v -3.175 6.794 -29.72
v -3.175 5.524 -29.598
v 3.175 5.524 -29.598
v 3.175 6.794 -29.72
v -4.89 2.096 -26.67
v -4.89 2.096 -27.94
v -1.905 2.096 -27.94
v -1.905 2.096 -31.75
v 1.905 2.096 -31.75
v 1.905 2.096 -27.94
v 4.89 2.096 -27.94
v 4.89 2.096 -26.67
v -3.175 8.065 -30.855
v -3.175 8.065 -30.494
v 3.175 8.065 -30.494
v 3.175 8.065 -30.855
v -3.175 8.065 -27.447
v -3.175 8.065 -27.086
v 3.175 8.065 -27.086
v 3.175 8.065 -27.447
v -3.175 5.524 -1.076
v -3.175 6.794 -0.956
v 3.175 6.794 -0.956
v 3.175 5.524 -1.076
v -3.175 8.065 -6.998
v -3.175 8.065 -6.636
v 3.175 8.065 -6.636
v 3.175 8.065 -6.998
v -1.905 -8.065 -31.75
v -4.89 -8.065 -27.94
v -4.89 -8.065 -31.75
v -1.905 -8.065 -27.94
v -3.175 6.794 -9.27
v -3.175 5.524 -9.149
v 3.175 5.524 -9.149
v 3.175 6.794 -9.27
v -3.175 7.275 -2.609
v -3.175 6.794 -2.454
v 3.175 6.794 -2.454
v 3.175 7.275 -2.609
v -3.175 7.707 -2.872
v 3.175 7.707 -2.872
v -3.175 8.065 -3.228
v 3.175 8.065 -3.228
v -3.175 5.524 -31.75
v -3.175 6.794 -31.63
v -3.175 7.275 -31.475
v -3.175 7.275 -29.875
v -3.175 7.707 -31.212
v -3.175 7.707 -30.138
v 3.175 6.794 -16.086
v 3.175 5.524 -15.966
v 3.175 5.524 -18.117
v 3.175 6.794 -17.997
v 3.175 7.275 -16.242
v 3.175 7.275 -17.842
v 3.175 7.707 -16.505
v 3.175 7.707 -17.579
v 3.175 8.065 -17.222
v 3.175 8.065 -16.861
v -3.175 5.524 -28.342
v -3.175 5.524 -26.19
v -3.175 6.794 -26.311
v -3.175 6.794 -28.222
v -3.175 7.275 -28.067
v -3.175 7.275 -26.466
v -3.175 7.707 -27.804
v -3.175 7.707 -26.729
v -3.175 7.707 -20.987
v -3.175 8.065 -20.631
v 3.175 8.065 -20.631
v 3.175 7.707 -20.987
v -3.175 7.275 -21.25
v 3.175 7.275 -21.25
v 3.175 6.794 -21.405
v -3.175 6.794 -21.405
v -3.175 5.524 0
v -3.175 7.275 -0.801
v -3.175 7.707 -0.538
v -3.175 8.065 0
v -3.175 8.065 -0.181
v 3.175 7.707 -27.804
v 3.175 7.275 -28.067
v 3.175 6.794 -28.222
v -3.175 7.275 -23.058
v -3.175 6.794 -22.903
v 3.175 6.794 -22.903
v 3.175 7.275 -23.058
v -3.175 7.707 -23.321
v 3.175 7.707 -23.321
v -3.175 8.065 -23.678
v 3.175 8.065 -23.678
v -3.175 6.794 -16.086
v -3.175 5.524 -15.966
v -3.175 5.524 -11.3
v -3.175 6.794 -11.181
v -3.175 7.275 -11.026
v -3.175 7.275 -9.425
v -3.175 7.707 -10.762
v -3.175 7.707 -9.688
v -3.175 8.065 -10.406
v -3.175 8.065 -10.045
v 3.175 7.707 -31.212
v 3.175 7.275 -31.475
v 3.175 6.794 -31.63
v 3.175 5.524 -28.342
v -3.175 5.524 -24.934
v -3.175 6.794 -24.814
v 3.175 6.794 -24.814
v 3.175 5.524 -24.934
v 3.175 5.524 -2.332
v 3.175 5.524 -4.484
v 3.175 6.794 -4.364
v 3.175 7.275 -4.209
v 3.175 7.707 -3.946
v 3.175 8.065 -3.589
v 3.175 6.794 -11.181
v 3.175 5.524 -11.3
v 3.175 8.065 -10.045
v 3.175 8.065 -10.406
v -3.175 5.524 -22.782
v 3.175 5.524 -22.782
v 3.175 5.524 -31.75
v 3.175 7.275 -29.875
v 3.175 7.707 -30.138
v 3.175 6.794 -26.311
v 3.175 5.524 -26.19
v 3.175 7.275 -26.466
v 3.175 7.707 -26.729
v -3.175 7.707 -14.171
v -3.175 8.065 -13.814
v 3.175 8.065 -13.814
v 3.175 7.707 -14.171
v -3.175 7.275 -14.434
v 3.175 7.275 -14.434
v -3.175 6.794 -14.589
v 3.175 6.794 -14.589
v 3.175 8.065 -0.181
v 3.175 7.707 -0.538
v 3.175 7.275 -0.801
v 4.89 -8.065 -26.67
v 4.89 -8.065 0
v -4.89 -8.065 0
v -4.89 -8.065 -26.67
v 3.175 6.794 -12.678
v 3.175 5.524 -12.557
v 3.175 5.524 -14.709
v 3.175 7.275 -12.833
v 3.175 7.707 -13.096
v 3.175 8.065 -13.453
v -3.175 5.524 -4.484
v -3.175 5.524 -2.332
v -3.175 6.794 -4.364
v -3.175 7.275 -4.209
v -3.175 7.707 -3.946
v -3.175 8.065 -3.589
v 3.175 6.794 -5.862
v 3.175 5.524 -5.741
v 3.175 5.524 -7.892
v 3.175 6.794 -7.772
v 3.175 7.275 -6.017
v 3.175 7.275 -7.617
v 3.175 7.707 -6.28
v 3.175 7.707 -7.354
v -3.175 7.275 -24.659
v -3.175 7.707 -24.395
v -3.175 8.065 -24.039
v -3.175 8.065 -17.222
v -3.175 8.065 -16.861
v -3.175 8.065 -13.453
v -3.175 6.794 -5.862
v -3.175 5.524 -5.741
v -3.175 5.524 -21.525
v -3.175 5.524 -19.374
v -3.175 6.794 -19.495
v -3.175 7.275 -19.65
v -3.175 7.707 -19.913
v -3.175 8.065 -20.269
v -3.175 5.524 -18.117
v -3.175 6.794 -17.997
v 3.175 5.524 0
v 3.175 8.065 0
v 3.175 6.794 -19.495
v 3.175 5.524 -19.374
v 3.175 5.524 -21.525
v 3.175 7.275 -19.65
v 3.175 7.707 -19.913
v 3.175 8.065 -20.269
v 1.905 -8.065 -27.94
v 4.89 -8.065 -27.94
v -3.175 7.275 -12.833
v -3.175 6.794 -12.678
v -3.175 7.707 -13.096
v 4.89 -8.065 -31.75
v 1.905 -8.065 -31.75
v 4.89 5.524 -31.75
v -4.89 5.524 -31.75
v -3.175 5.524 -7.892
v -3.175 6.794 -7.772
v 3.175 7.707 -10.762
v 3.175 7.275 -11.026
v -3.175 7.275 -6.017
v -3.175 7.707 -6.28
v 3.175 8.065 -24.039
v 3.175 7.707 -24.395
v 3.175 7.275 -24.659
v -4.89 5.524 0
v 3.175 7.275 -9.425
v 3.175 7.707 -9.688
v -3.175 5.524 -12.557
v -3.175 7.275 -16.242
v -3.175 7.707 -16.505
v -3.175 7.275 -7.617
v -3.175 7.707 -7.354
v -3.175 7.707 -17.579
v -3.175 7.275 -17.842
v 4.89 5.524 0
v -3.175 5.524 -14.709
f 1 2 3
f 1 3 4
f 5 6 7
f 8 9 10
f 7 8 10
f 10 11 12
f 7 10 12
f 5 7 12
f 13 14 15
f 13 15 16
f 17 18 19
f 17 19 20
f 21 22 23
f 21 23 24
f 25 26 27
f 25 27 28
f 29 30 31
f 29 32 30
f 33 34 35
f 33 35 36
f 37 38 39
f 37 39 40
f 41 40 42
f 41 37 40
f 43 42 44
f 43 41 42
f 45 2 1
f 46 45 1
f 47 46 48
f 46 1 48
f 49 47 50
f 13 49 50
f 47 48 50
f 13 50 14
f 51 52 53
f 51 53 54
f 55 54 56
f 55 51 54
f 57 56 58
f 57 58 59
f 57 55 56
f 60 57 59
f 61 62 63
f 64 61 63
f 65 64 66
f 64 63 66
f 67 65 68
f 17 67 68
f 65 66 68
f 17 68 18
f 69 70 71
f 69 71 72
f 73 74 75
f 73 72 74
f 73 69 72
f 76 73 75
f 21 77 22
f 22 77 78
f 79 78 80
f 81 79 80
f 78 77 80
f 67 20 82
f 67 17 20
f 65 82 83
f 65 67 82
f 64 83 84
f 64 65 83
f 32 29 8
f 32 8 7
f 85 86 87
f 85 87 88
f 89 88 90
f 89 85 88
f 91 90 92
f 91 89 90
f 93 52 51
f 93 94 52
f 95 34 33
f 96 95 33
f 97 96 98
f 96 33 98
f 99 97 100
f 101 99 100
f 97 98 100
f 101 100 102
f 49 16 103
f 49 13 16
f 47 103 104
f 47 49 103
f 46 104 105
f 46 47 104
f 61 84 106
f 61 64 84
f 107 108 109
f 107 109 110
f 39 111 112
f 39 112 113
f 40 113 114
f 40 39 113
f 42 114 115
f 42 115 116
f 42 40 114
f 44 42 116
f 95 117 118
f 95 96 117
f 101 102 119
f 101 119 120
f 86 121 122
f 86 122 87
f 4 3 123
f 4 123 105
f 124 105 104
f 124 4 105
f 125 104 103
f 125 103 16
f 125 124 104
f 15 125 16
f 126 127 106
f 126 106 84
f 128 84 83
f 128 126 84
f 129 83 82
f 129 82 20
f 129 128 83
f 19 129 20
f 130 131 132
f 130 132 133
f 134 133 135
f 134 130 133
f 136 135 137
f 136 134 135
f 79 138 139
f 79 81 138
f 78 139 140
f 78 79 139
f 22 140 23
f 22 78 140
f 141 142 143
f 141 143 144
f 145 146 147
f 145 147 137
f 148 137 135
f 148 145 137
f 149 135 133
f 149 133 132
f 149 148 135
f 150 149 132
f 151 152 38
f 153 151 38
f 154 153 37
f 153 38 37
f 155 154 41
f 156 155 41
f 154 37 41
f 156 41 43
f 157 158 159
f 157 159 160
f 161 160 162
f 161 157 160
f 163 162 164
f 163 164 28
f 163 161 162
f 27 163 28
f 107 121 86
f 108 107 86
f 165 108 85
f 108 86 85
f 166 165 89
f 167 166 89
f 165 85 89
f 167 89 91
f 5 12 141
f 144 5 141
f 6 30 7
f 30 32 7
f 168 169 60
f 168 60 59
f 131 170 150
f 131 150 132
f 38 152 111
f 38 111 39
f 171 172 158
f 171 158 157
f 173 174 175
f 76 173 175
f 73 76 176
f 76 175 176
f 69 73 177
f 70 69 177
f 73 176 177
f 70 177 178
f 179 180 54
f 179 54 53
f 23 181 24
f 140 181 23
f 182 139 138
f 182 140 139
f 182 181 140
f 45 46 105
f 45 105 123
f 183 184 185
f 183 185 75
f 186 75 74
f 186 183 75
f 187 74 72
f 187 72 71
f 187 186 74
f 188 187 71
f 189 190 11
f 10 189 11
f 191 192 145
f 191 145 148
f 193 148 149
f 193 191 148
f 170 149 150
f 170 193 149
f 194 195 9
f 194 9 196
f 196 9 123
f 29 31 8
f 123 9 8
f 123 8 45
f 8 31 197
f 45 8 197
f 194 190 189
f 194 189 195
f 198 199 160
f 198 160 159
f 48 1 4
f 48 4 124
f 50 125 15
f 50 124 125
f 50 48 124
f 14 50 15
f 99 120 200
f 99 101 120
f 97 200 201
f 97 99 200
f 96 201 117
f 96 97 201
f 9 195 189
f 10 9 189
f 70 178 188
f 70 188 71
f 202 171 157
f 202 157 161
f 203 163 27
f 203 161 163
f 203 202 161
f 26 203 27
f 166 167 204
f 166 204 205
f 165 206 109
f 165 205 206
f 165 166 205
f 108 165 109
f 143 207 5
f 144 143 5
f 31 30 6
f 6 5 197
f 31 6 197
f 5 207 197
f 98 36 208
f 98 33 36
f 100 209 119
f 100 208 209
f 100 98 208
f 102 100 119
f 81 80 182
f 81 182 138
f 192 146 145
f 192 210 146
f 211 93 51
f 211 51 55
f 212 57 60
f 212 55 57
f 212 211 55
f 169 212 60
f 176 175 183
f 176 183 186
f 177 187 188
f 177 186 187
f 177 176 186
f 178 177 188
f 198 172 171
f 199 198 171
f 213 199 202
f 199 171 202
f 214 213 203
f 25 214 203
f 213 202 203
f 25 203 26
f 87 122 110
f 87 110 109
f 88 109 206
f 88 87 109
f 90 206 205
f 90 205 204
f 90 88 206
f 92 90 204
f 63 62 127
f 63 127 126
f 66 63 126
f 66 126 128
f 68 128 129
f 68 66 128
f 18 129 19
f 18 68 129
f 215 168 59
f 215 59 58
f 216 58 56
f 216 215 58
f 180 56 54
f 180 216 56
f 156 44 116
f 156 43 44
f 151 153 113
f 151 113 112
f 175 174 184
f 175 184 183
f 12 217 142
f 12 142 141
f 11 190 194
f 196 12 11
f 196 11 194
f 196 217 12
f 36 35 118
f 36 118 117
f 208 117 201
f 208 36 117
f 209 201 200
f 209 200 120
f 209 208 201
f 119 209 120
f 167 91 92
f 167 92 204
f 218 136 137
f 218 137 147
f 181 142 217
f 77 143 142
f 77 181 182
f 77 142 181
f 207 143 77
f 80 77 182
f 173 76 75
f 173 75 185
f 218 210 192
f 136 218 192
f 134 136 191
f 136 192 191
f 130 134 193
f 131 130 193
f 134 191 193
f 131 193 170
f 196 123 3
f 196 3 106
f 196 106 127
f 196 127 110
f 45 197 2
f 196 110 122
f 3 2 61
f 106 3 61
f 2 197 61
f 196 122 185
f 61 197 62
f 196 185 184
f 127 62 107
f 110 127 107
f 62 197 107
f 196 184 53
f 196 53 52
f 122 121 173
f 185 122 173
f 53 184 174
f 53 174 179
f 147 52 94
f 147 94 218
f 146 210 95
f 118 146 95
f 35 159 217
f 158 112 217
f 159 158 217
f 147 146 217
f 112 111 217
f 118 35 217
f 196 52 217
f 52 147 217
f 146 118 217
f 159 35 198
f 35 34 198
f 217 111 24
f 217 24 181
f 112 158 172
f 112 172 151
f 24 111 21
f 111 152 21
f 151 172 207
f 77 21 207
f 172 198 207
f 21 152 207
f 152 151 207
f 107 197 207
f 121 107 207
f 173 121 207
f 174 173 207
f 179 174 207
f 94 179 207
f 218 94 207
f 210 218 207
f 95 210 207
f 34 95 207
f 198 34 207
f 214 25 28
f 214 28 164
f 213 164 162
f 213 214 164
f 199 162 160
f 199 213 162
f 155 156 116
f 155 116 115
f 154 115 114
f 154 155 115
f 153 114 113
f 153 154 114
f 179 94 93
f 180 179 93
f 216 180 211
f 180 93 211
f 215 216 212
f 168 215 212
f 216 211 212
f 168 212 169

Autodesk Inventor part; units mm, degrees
ref_plane "YZ Plane" through (0, 0, 0) normal (1, 0, 0) x (0, 1, 0)
ref_plane "XZ Plane" through (0, 0, 0) normal (0, 1, 0) x (-1, 0, 0)
ref_plane "XY Plane" through (0, 0, 0) normal (0, 0, 1) x (1, 0, 0)
sketch "Sketch2" plane through (0, 0, 0) normal (1, 0, 0) x (0, 1, 0)
  line L0 (-5.5245, 31.75) -> (-5.5245, -31.75)
  line L1 (-5.5245, -31.75) -> (5.5245, -31.75)
  line L2 (5.5245, -31.75) -> (5.5245, 31.75)
  line L3 (5.5245, 31.75) -> (-5.5245, 31.75)
  line L4 (-5.5245, 31.75) -> (5.5245, -31.75) construction
  line L5 (-5.5245, -31.75) -> (5.5245, 31.75) construction
  point P0 (0, 0)
  dimension "d4" = 63.5
  dimension "d5" = 11.049
extrude "Extrusion2" add sketch "Sketch2" along normal mid plane 9.779
sketch "Sketch3" plane through (0, 0, 0) normal (1, 0, 0) x (0, 1, 0)
  line L0 (5.5245, -31.75) -> (5.5245, 31.75) projected
  line L1 (5.5245, 31.9532) -> (5.5245, 29.4132)
  line L2 (5.5245, 31.9532) -> (5.5245, 29.4132)
  arc A0 (8.0645, 30.8543) -> (6.7945, 31.629) centre (6.3804, 29.5218) ccw
  line L3 (8.0645, 30.6737) -> (7.6408, 30.6737)
  arc A1 (6.7945, 29.7184) -> (8.0645, 30.4931) centre (6.3804, 31.8256) ccw
  line L4 (8.0645, 30.8543) -> (8.0645, 30.4931)
  line L5 (5.5245, 31.75) -> (5.5245, -31.75)
  arc A2 (8.0642, -1.6042) -> (8.0645, -1.6033) centre (6.6313, -1.0154) ccw
  line L6 (6.7945, 31.629) -> (5.5245, 31.7489)
  line L7 (6.7945, 29.7184) -> (5.5245, 29.5986)
  line L8 (5.5245, 31.7489) -> (6.7945, 31.629)
  line L9 (6.7945, 29.7184) -> (5.5245, 29.5986)
  line L10 (5.5245, 29.5986) -> (5.5245, 31.7489)
  arc A3 (8.0645, 30.8543) -> (6.7945, 31.629) centre (6.3804, 29.5218) ccw
  arc A4 (6.7945, 29.7184) -> (8.0645, 30.4931) centre (6.3804, 31.8256) ccw
  line L11 (8.0645, 30.8543) -> (8.0645, 30.4931)
  line L12 (8.0645, 27.2655) -> (7.6408, 27.2655)
  line L13 (8.0645, 27.4461) -> (8.0645, 27.0848)
  line L14 (8.0645, 27.4461) -> (8.0645, 27.0848)
  arc A5 (6.7945, 26.3101) -> (8.0645, 27.0848) centre (6.3804, 28.4173) ccw
  arc A6 (8.0645, 27.4461) -> (6.7945, 28.2208) centre (6.3804, 26.1136) ccw
  arc A7 (6.7945, 26.3101) -> (8.0645, 27.0848) centre (6.3804, 28.4173) ccw
  arc A8 (8.0645, 27.4461) -> (6.7945, 28.2208) centre (6.3804, 26.1136) ccw
  line L15 (5.5245, 28.3417) -> (5.5245, -35.1582)
  line L16 (5.5245, 28.5449) -> (5.5245, 26.0049)
  line L17 (6.7945, 26.3101) -> (5.5245, 26.1903)
  line L18 (5.5245, 28.3406) -> (6.7945, 28.2208)
  line L19 (6.7945, 26.3101) -> (5.5245, 26.1903)
  line L20 (5.5245, 26.1903) -> (5.5245, 28.3406)
  line L21 (5.5245, 28.5449) -> (5.5245, 26.0049)
  line L22 (6.7945, 28.2208) -> (5.5245, 28.3406)
  line L23 (8.0645, 23.8572) -> (7.6408, 23.8572)
  line L24 (8.0645, 24.0378) -> (8.0645, 23.6766)
  line L25 (8.0645, 24.0378) -> (8.0645, 23.6766)
  arc A9 (6.7945, 22.9019) -> (8.0645, 23.6766) centre (6.3804, 25.0091) ccw
  arc A10 (8.0645, 24.0378) -> (6.7945, 24.8125) centre (6.3804, 22.7053) ccw
  arc A11 (6.7945, 22.9019) -> (8.0645, 23.6766) centre (6.3804, 25.0091) ccw
  arc A12 (8.0645, 24.0378) -> (6.7945, 24.8125) centre (6.3804, 22.7053) ccw
  line L26 (5.5245, 24.9335) -> (5.5245, -38.5665)
  line L27 (5.5245, 25.1367) -> (5.5245, 22.5967)
  line L28 (6.7945, 22.9019) -> (5.5245, 22.782)
  line L29 (5.5245, 24.9324) -> (6.7945, 24.8125)
  line L30 (6.7945, 22.9019) -> (5.5245, 22.782)
  line L31 (5.5245, 22.782) -> (5.5245, 24.9324)
  line L32 (5.5245, 25.1367) -> (5.5245, 22.5967)
  line L33 (6.7945, 24.8125) -> (5.5245, 24.9324)
  line L34 (8.0645, 20.449) -> (7.6408, 20.449)
  line L35 (8.0645, 20.6296) -> (8.0645, 20.2683)
  line L36 (8.0645, 20.6296) -> (8.0645, 20.2683)
  arc A13 (6.7945, 19.4936) -> (8.0645, 20.2683) centre (6.3804, 21.6008) ccw
  arc A14 (8.0645, 20.6296) -> (6.7945, 21.4043) centre (6.3804, 19.2971) ccw
  arc A15 (6.7945, 19.4936) -> (8.0645, 20.2683) centre (6.3804, 21.6008) ccw
  arc A16 (8.0645, 20.6296) -> (6.7945, 21.4043) centre (6.3804, 19.2971) ccw
  line L37 (5.5245, 21.5252) -> (5.5245, -41.9747)
  line L38 (5.5245, 21.7284) -> (5.5245, 19.1884)
  line L39 (6.7945, 19.4936) -> (5.5245, 19.3738)
  line L40 (5.5245, 21.5241) -> (6.7945, 21.4043)
  line L41 (6.7945, 19.4936) -> (5.5245, 19.3738)
  line L42 (5.5245, 19.3738) -> (5.5245, 21.5241)
  line L43 (5.5245, 21.7284) -> (5.5245, 19.1884)
  line L44 (6.7945, 21.4043) -> (5.5245, 21.5241)
  line L45 (8.0645, 17.0407) -> (7.6408, 17.0407)
  line L46 (8.0645, 17.2213) -> (8.0645, 16.8601)
  line L47 (8.0645, 17.2213) -> (8.0645, 16.8601)
  arc A17 (6.7945, 16.0854) -> (8.0645, 16.8601) centre (6.3804, 18.1926) ccw
  arc A18 (8.0645, 17.2213) -> (6.7945, 17.996) centre (6.3804, 15.8888) ccw
  arc A19 (6.7945, 16.0854) -> (8.0645, 16.8601) centre (6.3804, 18.1926) ccw
  arc A20 (8.0645, 17.2213) -> (6.7945, 17.996) centre (6.3804, 15.8888) ccw
  line L48 (5.5245, 18.117) -> (5.5245, -45.383)
  line L49 (5.5245, 18.3202) -> (5.5245, 15.7802)
  line L50 (6.7945, 16.0854) -> (5.5245, 15.9655)
  line L51 (5.5245, 18.1159) -> (6.7945, 17.996)
  line L52 (6.7945, 16.0854) -> (5.5245, 15.9655)
  line L53 (5.5245, 15.9655) -> (5.5245, 18.1159)
  line L54 (5.5245, 18.3202) -> (5.5245, 15.7802)
  line L55 (6.7945, 17.996) -> (5.5245, 18.1159)
  line L56 (8.0645, 13.6324) -> (7.6408, 13.6324)
  line L57 (8.0645, 13.8131) -> (8.0645, 13.4518)
  line L58 (8.0645, 13.8131) -> (8.0645, 13.4518)
  arc A21 (6.7945, 12.6771) -> (8.0645, 13.4518) centre (6.3804, 14.7843) ccw
  arc A22 (8.0645, 13.8131) -> (6.7945, 14.5878) centre (6.3804, 12.4806) ccw
  arc A23 (6.7945, 12.6771) -> (8.0645, 13.4518) centre (6.3804, 14.7843) ccw
  arc A24 (8.0645, 13.8131) -> (6.7945, 14.5878) centre (6.3804, 12.4806) ccw
  line L59 (5.5245, 14.7087) -> (5.5245, -48.7912)
  line L60 (5.5245, 14.9119) -> (5.5245, 12.3719)
  line L61 (6.7945, 12.6771) -> (5.5245, 12.5573)
  line L62 (5.5245, 14.7076) -> (6.7945, 14.5878)
  line L63 (6.7945, 12.6771) -> (5.5245, 12.5573)
  line L64 (5.5245, 12.5573) -> (5.5245, 14.7076)
  line L65 (5.5245, 14.9119) -> (5.5245, 12.3719)
  line L66 (6.7945, 14.5878) -> (5.5245, 14.7076)
  line L67 (8.0645, 10.2242) -> (7.6408, 10.2242)
  line L68 (8.0645, 10.4048) -> (8.0645, 10.0436)
  line L69 (8.0645, 10.4048) -> (8.0645, 10.0436)
  arc A25 (6.7945, 9.2689) -> (8.0645, 10.0436) centre (6.3804, 11.3761) ccw
  arc A26 (8.0645, 10.4048) -> (6.7945, 11.1795) centre (6.3804, 9.0723) ccw
  arc A27 (6.7945, 9.2689) -> (8.0645, 10.0436) centre (6.3804, 11.3761) ccw
  arc A28 (8.0645, 10.4048) -> (6.7945, 11.1795) centre (6.3804, 9.0723) ccw
  line L70 (5.5245, 11.3005) -> (5.5245, -52.1995)
  line L71 (5.5245, 11.5037) -> (5.5245, 8.9637)
  line L72 (6.7945, 9.2689) -> (5.5245, 9.149)
  line L73 (5.5245, 11.2994) -> (6.7945, 11.1795)
  line L74 (6.7945, 9.2689) -> (5.5245, 9.149)
  line L75 (5.5245, 9.149) -> (5.5245, 11.2994)
  line L76 (5.5245, 11.5037) -> (5.5245, 8.9637)
  line L77 (6.7945, 11.1795) -> (5.5245, 11.2994)
  line L78 (8.0645, 6.8159) -> (7.6408, 6.8159)
  line L79 (8.0645, 6.9966) -> (8.0645, 6.6353)
  line L80 (8.0645, 6.9966) -> (8.0645, 6.6353)
  arc A29 (6.7945, 5.8606) -> (8.0645, 6.6353) centre (6.3804, 7.9678) ccw
  arc A30 (8.0645, 6.9966) -> (6.7945, 7.7713) centre (6.3804, 5.6641) ccw
  arc A31 (6.7945, 5.8606) -> (8.0645, 6.6353) centre (6.3804, 7.9678) ccw
  arc A32 (8.0645, 6.9966) -> (6.7945, 7.7713) centre (6.3804, 5.6641) ccw
  line L81 (5.5245, 7.8922) -> (5.5245, -55.6077)
  line L82 (5.5245, 8.0954) -> (5.5245, 5.5554)
  line L83 (6.7945, 5.8606) -> (5.5245, 5.7408)
  line L84 (5.5245, 7.8911) -> (6.7945, 7.7713)
  line L85 (6.7945, 5.8606) -> (5.5245, 5.7408)
  line L86 (5.5245, 5.7408) -> (5.5245, 7.8911)
  line L87 (5.5245, 8.0954) -> (5.5245, 5.5554)
  line L88 (6.7945, 7.7713) -> (5.5245, 7.8911)
  line L89 (8.0645, 3.4077) -> (7.6408, 3.4077)
  line L90 (8.0645, 3.5883) -> (8.0645, 3.2271)
  line L91 (8.0645, 3.5883) -> (8.0645, 3.2271)
  arc A33 (6.7945, 2.4524) -> (8.0645, 3.2271) centre (6.3804, 4.5596) ccw
  arc A34 (8.0645, 3.5883) -> (6.7945, 4.363) centre (6.3804, 2.2558) ccw
  arc A35 (6.7945, 2.4524) -> (8.0645, 3.2271) centre (6.3804, 4.5596) ccw
  arc A36 (8.0645, 3.5883) -> (6.7945, 4.363) centre (6.3804, 2.2558) ccw
  line L92 (5.5245, 4.484) -> (5.5245, -59.016)
  line L93 (5.5245, 4.6872) -> (5.5245, 2.1472)
  line L94 (6.7945, 2.4524) -> (5.5245, 2.3325)
  line L95 (5.5245, 4.4829) -> (6.7945, 4.363)
  line L96 (6.7945, 2.4524) -> (5.5245, 2.3325)
  line L97 (5.5245, 2.3325) -> (5.5245, 4.4829)
  line L98 (5.5245, 4.6872) -> (5.5245, 2.1472)
  line L99 (6.7945, 4.363) -> (5.5245, 4.4829)
  line L100 (8.0645, -0.0006) -> (7.6408, -0.0006)
  line L101 (8.0645, 0.1801) -> (8.0645, -0.1812)
  line L102 (8.0645, 0.1801) -> (8.0645, -0.1812)
  arc A37 (6.7945, -0.9559) -> (8.0645, -0.1812) centre (6.3804, 1.1513) ccw
  arc A38 (8.0645, 0.1801) -> (6.7945, 0.9548) centre (6.3804, -1.1524) ccw
  arc A39 (6.7945, -0.9559) -> (8.0645, -0.1812) centre (6.3804, 1.1513) ccw
  arc A40 (8.0645, 0.1801) -> (6.7945, 0.9548) centre (6.3804, -1.1524) ccw
  line L103 (5.5245, 1.0757) -> (5.5245, -62.4242)
  line L104 (5.5245, 1.2789) -> (5.5245, -1.2611)
  line L105 (6.7945, -0.9559) -> (5.5245, -1.0757)
  line L106 (5.5245, 1.0746) -> (6.7945, 0.9548)
  line L107 (6.7945, -0.9559) -> (5.5245, -1.0757)
  line L108 (5.5245, -1.0757) -> (5.5245, 1.0746)
  line L109 (5.5245, 1.2789) -> (5.5245, -1.2611)
  line L110 (6.7945, 0.9548) -> (5.5245, 1.0746)
  line L111 (8.0645, -3.4088) -> (7.6408, -3.4088)
  line L112 (8.0645, -3.2282) -> (8.0645, -3.5894)
  line L113 (8.0645, -3.2282) -> (8.0645, -3.5894)
  arc A41 (6.7945, -4.3641) -> (8.0645, -3.5894) centre (6.3804, -2.2569) ccw
  arc A42 (8.0645, -3.2282) -> (6.7945, -2.4535) centre (6.3804, -4.5607) ccw
  arc A43 (6.7945, -4.3641) -> (8.0645, -3.5894) centre (6.3804, -2.2569) ccw
  arc A44 (8.0645, -3.2282) -> (6.7945, -2.4535) centre (6.3804, -4.5607) ccw
  line L114 (5.5245, -2.3325) -> (5.5245, -65.8325)
  line L115 (5.5245, -2.1293) -> (5.5245, -4.6693)
  line L116 (6.7945, -4.3641) -> (5.5245, -4.484)
  line L117 (5.5245, -2.3337) -> (6.7945, -2.4535)
  line L118 (6.7945, -4.3641) -> (5.5245, -4.484)
  line L119 (5.5245, -4.484) -> (5.5245, -2.3337)
  line L120 (5.5245, -2.1293) -> (5.5245, -4.6693)
  line L121 (6.7945, -2.4535) -> (5.5245, -2.3337)
  line L122 (8.0645, -6.8171) -> (7.6408, -6.8171)
  line L123 (8.0645, -6.6364) -> (8.0645, -6.9977)
  line L124 (8.0645, -6.6364) -> (8.0645, -6.9977)
  arc A45 (6.7945, -7.7724) -> (8.0645, -6.9977) centre (6.3804, -5.6652) ccw
  arc A46 (8.0645, -6.6364) -> (6.7945, -5.8617) centre (6.3804, -7.9689) ccw
  arc A47 (6.7945, -7.7724) -> (8.0645, -6.9977) centre (6.3804, -5.6652) ccw
  arc A48 (8.0645, -6.6364) -> (6.7945, -5.8617) centre (6.3804, -7.9689) ccw
  line L125 (5.5245, -5.7408) -> (5.5245, -69.2407)
  line L126 (5.5245, -5.5376) -> (5.5245, -8.0776)
  line L127 (6.7945, -7.7724) -> (5.5245, -7.8922)
  line L128 (5.5245, -5.7419) -> (6.7945, -5.8617)
  line L129 (6.7945, -7.7724) -> (5.5245, -7.8922)
  line L130 (5.5245, -7.8922) -> (5.5245, -5.7419)
  line L131 (5.5245, -5.5376) -> (5.5245, -8.0776)
  line L132 (6.7945, -5.8617) -> (5.5245, -5.7419)
  line L133 (8.0645, -10.2253) -> (7.6408, -10.2253)
  line L134 (8.0645, -10.0447) -> (8.0645, -10.4059)
  line L135 (8.0645, -10.0447) -> (8.0645, -10.4059)
  arc A49 (6.7945, -11.1806) -> (8.0645, -10.4059) centre (6.3804, -9.0734) ccw
  arc A50 (8.0645, -10.0447) -> (6.7945, -9.27) centre (6.3804, -11.3772) ccw
  arc A51 (6.7945, -11.1806) -> (8.0645, -10.4059) centre (6.3804, -9.0734) ccw
  arc A52 (8.0645, -10.0447) -> (6.7945, -9.27) centre (6.3804, -11.3772) ccw
  line L136 (5.5245, -9.149) -> (5.5245, -72.649)
  line L137 (5.5245, -8.9458) -> (5.5245, -11.4858)
  line L138 (6.7945, -11.1806) -> (5.5245, -11.3005)
  line L139 (5.5245, -9.1502) -> (6.7945, -9.27)
  line L140 (6.7945, -11.1806) -> (5.5245, -11.3005)
  line L141 (5.5245, -11.3005) -> (5.5245, -9.1502)
  line L142 (5.5245, -8.9458) -> (5.5245, -11.4858)
  line L143 (6.7945, -9.27) -> (5.5245, -9.1502)
  line L144 (8.0645, -13.6336) -> (7.6408, -13.6336)
  line L145 (8.0645, -13.4529) -> (8.0645, -13.8142)
  line L146 (8.0645, -13.4529) -> (8.0645, -13.8142)
  arc A53 (6.7945, -14.5889) -> (8.0645, -13.8142) centre (6.3804, -12.4817) ccw
  arc A54 (8.0645, -13.4529) -> (6.7945, -12.6782) centre (6.3804, -14.7854) ccw
  arc A55 (6.7945, -14.5889) -> (8.0645, -13.8142) centre (6.3804, -12.4817) ccw
  arc A56 (8.0645, -13.4529) -> (6.7945, -12.6782) centre (6.3804, -14.7854) ccw
  line L147 (5.5245, -12.5573) -> (5.5245, -76.0572)
  line L148 (5.5245, -12.3541) -> (5.5245, -14.8941)
  line L149 (6.7945, -14.5889) -> (5.5245, -14.7087)
  line L150 (5.5245, -12.5584) -> (6.7945, -12.6782)
  line L151 (6.7945, -14.5889) -> (5.5245, -14.7087)
  line L152 (5.5245, -14.7087) -> (5.5245, -12.5584)
  line L153 (5.5245, -12.3541) -> (5.5245, -14.8941)
  line L154 (6.7945, -12.6782) -> (5.5245, -12.5584)
  line L155 (8.0645, -17.0418) -> (7.6408, -17.0418)
  line L156 (8.0645, -16.8612) -> (8.0645, -17.2224)
  line L157 (8.0645, -16.8612) -> (8.0645, -17.2224)
  arc A57 (6.7945, -17.9971) -> (8.0645, -17.2224) centre (6.3804, -15.8899) ccw
  arc A58 (8.0645, -16.8612) -> (6.7945, -16.0865) centre (6.3804, -18.1937) ccw
  arc A59 (6.7945, -17.9971) -> (8.0645, -17.2224) centre (6.3804, -15.8899) ccw
  arc A60 (8.0645, -16.8612) -> (6.7945, -16.0865) centre (6.3804, -18.1937) ccw
  line L158 (5.5245, -15.9655) -> (5.5245, -79.4655)
  line L159 (5.5245, -15.7623) -> (5.5245, -18.3023)
  line L160 (6.7945, -17.9971) -> (5.5245, -18.117)
  line L161 (5.5245, -15.9667) -> (6.7945, -16.0865)
  line L162 (6.7945, -17.9971) -> (5.5245, -18.117)
  line L163 (5.5245, -18.117) -> (5.5245, -15.9667)
  line L164 (5.5245, -15.7623) -> (5.5245, -18.3023)
  line L165 (6.7945, -16.0865) -> (5.5245, -15.9667)
  line L166 (8.0645, -20.4501) -> (7.6408, -20.4501)
  line L167 (8.0645, -20.2694) -> (8.0645, -20.6307)
  line L168 (8.0645, -20.2694) -> (8.0645, -20.6307)
  arc A61 (6.7945, -21.4054) -> (8.0645, -20.6307) centre (6.3804, -19.2982) ccw
  arc A62 (8.0645, -20.2694) -> (6.7945, -19.4947) centre (6.3804, -21.6019) ccw
  arc A63 (6.7945, -21.4054) -> (8.0645, -20.6307) centre (6.3804, -19.2982) ccw
  arc A64 (8.0645, -20.2694) -> (6.7945, -19.4947) centre (6.3804, -21.6019) ccw
  line L169 (5.5245, -19.3738) -> (5.5245, -82.8737)
  line L170 (5.5245, -19.1706) -> (5.5245, -21.7106)
  line L171 (6.7945, -21.4054) -> (5.5245, -21.5252)
  line L172 (5.5245, -19.3749) -> (6.7945, -19.4947)
  line L173 (6.7945, -21.4054) -> (5.5245, -21.5252)
  line L174 (5.5245, -21.5252) -> (5.5245, -19.3749)
  line L175 (5.5245, -19.1706) -> (5.5245, -21.7106)
  line L176 (6.7945, -19.4947) -> (5.5245, -19.3749)
  line L177 (8.0645, -23.8583) -> (7.6408, -23.8583)
  line L178 (8.0645, -23.6777) -> (8.0645, -24.0389)
  line L179 (8.0645, -23.6777) -> (8.0645, -24.0389)
  arc A65 (6.7945, -24.8136) -> (8.0645, -24.0389) centre (6.3804, -22.7064) ccw
  arc A66 (8.0645, -23.6777) -> (6.7945, -22.903) centre (6.3804, -25.0102) ccw
  arc A67 (6.7945, -24.8136) -> (8.0645, -24.0389) centre (6.3804, -22.7064) ccw
  arc A68 (8.0645, -23.6777) -> (6.7945, -22.903) centre (6.3804, -25.0102) ccw
  line L180 (5.5245, -22.782) -> (5.5245, -86.282)
  line L181 (5.5245, -22.5788) -> (5.5245, -25.1188)
  line L182 (6.7945, -24.8136) -> (5.5245, -24.9335)
  line L183 (5.5245, -22.7832) -> (6.7945, -22.903)
  line L184 (6.7945, -24.8136) -> (5.5245, -24.9335)
  line L185 (5.5245, -24.9335) -> (5.5245, -22.7832)
  line L186 (5.5245, -22.5788) -> (5.5245, -25.1188)
  line L187 (6.7945, -22.903) -> (5.5245, -22.7832)
  line L188 (8.0645, -27.2666) -> (7.6408, -27.2666)
  line L189 (8.0645, -27.0859) -> (8.0645, -27.4472)
  line L190 (8.0645, -27.0859) -> (8.0645, -27.4472)
  arc A69 (6.7945, -28.2219) -> (8.0645, -27.4472) centre (6.3804, -26.1147) ccw
  arc A70 (8.0645, -27.0859) -> (6.7945, -26.3112) centre (6.3804, -28.4184) ccw
  arc A71 (6.7945, -28.2219) -> (8.0645, -27.4472) centre (6.3804, -26.1147) ccw
  arc A72 (8.0645, -27.0859) -> (6.7945, -26.3112) centre (6.3804, -28.4184) ccw
  line L191 (5.5245, -26.1903) -> (5.5245, -89.6902)
  line L192 (5.5245, -25.9871) -> (5.5245, -28.5271)
  line L193 (6.7945, -28.2219) -> (5.5245, -28.3417)
  line L194 (5.5245, -26.1914) -> (6.7945, -26.3112)
  line L195 (6.7945, -28.2219) -> (5.5245, -28.3417)
  line L196 (5.5245, -28.3417) -> (5.5245, -26.1914)
  line L197 (5.5245, -25.9871) -> (5.5245, -28.5271)
  line L198 (6.7945, -26.3112) -> (5.5245, -26.1914)
  line L199 (8.0645, -30.6748) -> (7.6408, -30.6748)
  line L200 (8.0645, -30.4942) -> (8.0645, -30.8554)
  line L201 (8.0645, -30.4942) -> (8.0645, -30.8554)
  arc A73 (6.7945, -31.6301) -> (8.0645, -30.8554) centre (6.3804, -29.5229) ccw
  arc A74 (8.0645, -30.4942) -> (6.7945, -29.7195) centre (6.3804, -31.8267) ccw
  arc A75 (6.7945, -31.6301) -> (8.0645, -30.8554) centre (6.3804, -29.5229) ccw
  arc A76 (8.0645, -30.4942) -> (6.7945, -29.7195) centre (6.3804, -31.8267) ccw
  line L202 (5.5245, -29.5985) -> (5.5245, -93.0985)
  line L203 (5.5245, -29.3953) -> (5.5245, -31.9353)
  line L204 (6.7945, -31.6301) -> (5.5245, -31.75)
  line L205 (5.5245, -29.5997) -> (6.7945, -29.7195)
  line L206 (6.7945, -31.6301) -> (5.5245, -31.75)
  line L207 (5.5245, -31.75) -> (5.5245, -29.5997)
  line L208 (5.5245, -29.3953) -> (5.5245, -31.9353)
  line L209 (6.7945, -29.7195) -> (5.5245, -29.5997)
  point P0 (0, 0)
  point P1 (6.7953, 29.7185)
  point P2 (6.7953, 26.3103)
  point P3 (6.7953, 22.902)
  point P4 (6.7953, 19.4938)
  point P5 (6.7953, 16.0855)
  point P6 (6.7953, 12.6773)
  point P7 (6.7953, 9.269)
  point P8 (6.7953, 5.8608)
  point P9 (6.7953, 2.4525)
  point P10 (6.7953, -0.9557)
  point P11 (6.7953, -4.364)
  point P12 (6.7953, -7.7722)
  point P13 (6.7953, -11.1805)
  point P14 (6.7953, -14.5887)
  point P15 (6.7953, -17.997)
  point P16 (6.7953, -21.4052)
  point P17 (6.7953, -24.8135)
  point P18 (6.7953, -28.2217)
  point P19 (6.7953, -31.63)
  dimension "d9" = 2.3368
  dimension "d63" = 84.61
  dimension "d64" = 84.61
  dimension "d74" = 3.4082
sketch "Sketch4" plane through (-4.8895, -5.5245, -31.75) normal (0, -1, 0) x (1, 0, 0)
  line L0 (2.032, 0.0016) -> (7.747, 0.0016) projected
  line L1 (4.8895, 0.0016) -> (6.7945, 0.0016)
  line L2 (4.8895, 0.0016) -> (2.9845, 0.0016)
  line L3 (6.7945, 0.0016) -> (2.032, 0.0016)
  line L4 (2.9845, -0.9507) -> (6.7945, -0.9507)
  line L5 (6.7945, -0.9507) -> (6.7945, 0.0016)
  line L6 (6.7945, 0.0016) -> (6.7945, 2.5416)
  line L7 (7.747, 2.5416) -> (2.032, 2.5416) projected
  line L8 (2.032, 2.5416) -> (0, 2.5416)
  line L9 (0, 63.5) -> (0, 0) projected
  line L10 (6.7945, 2.5416) -> (9.779, 2.5416)
  line L11 (9.779, 0) -> (9.779, 63.5) projected
  line L12 (9.779, 2.5416) -> (9.779, 3.8116)
  line L13 (9.779, 3.8116) -> (0, 3.8116)
  line L14 (0, 2.5416) -> (0, 3.8116)
  line L15 (2.9845, 0.0016) -> (2.9845, -0.9507)
  line L16 (2.9845, 0.0016) -> (2.9845, 2.5416)
  line L17 (2.032, 2.5416) -> (2.9845, 2.5416)
  point P0 (4.8895, 31.75)
  dimension "d28" = 1.905
  dimension "d29" = 1.905
  dimension "d31" = 2.54
  dimension "d32" = 1.27
extrude "Extrusion4" cut sketch "Sketch4" against normal blind 10.16
sketch "Sketch5" plane through (-4.8895, -5.5245, 31.75) normal (0, -1, 0) x (1, 0, 0)
  line L0 (0, -59.6884) -> (9.779, -59.6884) projected
  line L1 (9.779, 0) -> (9.779, -59.6884) projected
  line L2 (9.779, 0) -> (0, 0) projected
  line L3 (0, -59.6884) -> (0, 0) projected
  line L4 (2.9845, -60.9584) -> (0, -60.9584) projected
  line L5 (0, -63.5) -> (0, -60.9584) projected
  line L6 (0, -63.5) -> (2.9845, -63.5) projected
  line L7 (2.9845, -63.5) -> (2.9845, -60.9584) projected
  line L8 (9.779, -60.9584) -> (6.7945, -60.9584) projected
  line L9 (6.7945, -60.9584) -> (6.7945, -63.5) projected
  line L10 (6.7945, -63.5) -> (9.779, -63.5) projected
  line L11 (9.779, -60.9584) -> (9.779, -63.5) projected
  point P0 (4.8895, -31.75)
extrude "Extrusion6" add sketch "Sketch5" along normal blind 2.54
sketch "Sketch6" plane through (4.8895, 0, 0) normal (1, 0, 0) x (0, 0, -1)
  line L0 (31.75, 5.5245) -> (31.75, -8.0645) projected
  line L1 (27.9384, 4.6355) -> (31.75, 4.6355)
  line L2 (31.75, 4.6355) -> (31.75, 2.0955)
  line L3 (31.75, 2.0955) -> (27.9384, 2.0955)
  line L4 (27.9384, 2.0955) -> (27.9384, 4.6355)
  point P0 (0, 0)
  dimension "d60" = 2.54
extrude "Extrusion7" add sketch "Sketch6" against normal blind 9.779
extrude "Extrusion8" add sketch "Sketch3" along normal mid plane 6.35 contours L0 L6 A0 L4 A1 L7 | L0 L18 A6 L13 A5 L17 | L0 L29 A10 L24 A9 L28 | L0 L40 A14 L35 A13 L39 | L0 L51 A18 L46 A17 L50 | L0 L62 A22 L57 A21 L61 | L0 L73 A26 L68 A25 L72 | L0 L84 A30 L79 A29 L83 | L0 L95 A34 L90 A33 L94 | L0 L117 A2 A42 L112 A41 L116 | L0 L128 A46 L123 A45 L127 | L0 L139 A50 L134 A49 L138 | L0 L150 A54 L145 A53 L149 | L0 L161 A58 L156 A57 L160 | L0 L172 A62 L167 A61 L171 | L0 L183 A66 L178 A65 L182 | L0 L194 A70 L189 A69 L193 | L0 L205 A74 L200 A73 L204 | L117 A42 A2 | A2 A37 L105 L0 | L0 L106 A38 L101 L100 A2 | L100 L101 A37 A2
sketch "Sketch7" plane through (4.8895, 0, 0) normal (1, 0, 0) x (0, 0, -1)
  line L0 (29.2084, 2.0955) -> (31.75, 2.0955) projected
  line L1 (27.9384, 2.0955) -> (27.9384, -8.0645) projected
  line L2 (29.2084, 2.0955) -> (27.9384, 2.0955)
  line L3 (27.9384, 2.0955) -> (27.9384, -8.0645)
  line L4 (27.9384, -8.0645) -> (29.2084, -8.0645)
  line L5 (29.2084, -8.0645) -> (29.2084, 2.0955)
  line L6 (27.9384, -8.0645) -> (26.6684, -8.0645)
  line L7 (26.6684, -8.0645) -> (26.6684, 2.0955)
  line L8 (26.6684, 2.0955) -> (27.9384, 2.0955)
  line L9 (27.9384, 2.0955) -> (27.9384, -8.0645)
  point P0 (0, 0)
  dimension "d81" = 1.27
extrude "Extrusion9" add sketch "Sketch7" against normal blind 9.779 contours L2 L5 L4 L1
sketch "Sketch8" plane through (4.8895, 0, 0) normal (1, 0, 0) x (0, 0, -1)
  line L0 (31.75, -8.0645) -> (29.2084, -8.0645) projected
  line L1 (31.75, -8.0645) -> (27.94, -8.0645)
  line L2 (-31.75, -8.0645) -> (31.75, -8.0645) projected
  line L3 (27.94, -8.0645) -> (26.67, -8.0645)
  line L4 (27.94, -8.0645) -> (27.94, 2.0955)
  line L5 (27.94, 2.0955) -> (26.67, 2.0955)
  line L6 (26.67, 2.0955) -> (26.67, -8.0645)
  point P0 (0, 0)
  dimension "d84" = 3.81
  dimension "d85" = 1.27
  dimension "d86" = 10.16
extrude "Extrusion10" cut sketch "Sketch8" against normal blind 9.779
sketch "Sketch9" plane through (4.8895, -8.0645, -27.94) normal (0, 0, 1) x (1, 0, 0)
  line L0 (-6.7945, 0) -> (-6.7945, 10.16) projected
  line L1 (-2.9845, 10.16) -> (-6.7945, 10.16) projected
  line L2 (-2.9845, 10.16) -> (-2.9845, 0) projected
  line L3 (-2.9845, 0) -> (-6.7945, 0) projected
  point P0 (-4.8895, 8.0645)
extrude "Extrusion11" cut sketch "Sketch9" against normal blind 9.779
sketch "Sketch10" plane through (-4.8895, 0, 0) normal (-1, 0, 0) x (0, 0, 1)
  line L0 (0, 10.8635) -> (42.4338, 10.8635)
  line L1 (42.4338, 10.8635) -> (42.4338, -15.1476)
  line L2 (42.4338, -15.1476) -> (0, -15.1476)
  line L3 (0, -15.1476) -> (0, 10.8635)
  point P0 (0, 0)
extrude "Extrusion12" cut sketch "Sketch10" against normal blind 25.4
properties part number "Alligator_Rack"
